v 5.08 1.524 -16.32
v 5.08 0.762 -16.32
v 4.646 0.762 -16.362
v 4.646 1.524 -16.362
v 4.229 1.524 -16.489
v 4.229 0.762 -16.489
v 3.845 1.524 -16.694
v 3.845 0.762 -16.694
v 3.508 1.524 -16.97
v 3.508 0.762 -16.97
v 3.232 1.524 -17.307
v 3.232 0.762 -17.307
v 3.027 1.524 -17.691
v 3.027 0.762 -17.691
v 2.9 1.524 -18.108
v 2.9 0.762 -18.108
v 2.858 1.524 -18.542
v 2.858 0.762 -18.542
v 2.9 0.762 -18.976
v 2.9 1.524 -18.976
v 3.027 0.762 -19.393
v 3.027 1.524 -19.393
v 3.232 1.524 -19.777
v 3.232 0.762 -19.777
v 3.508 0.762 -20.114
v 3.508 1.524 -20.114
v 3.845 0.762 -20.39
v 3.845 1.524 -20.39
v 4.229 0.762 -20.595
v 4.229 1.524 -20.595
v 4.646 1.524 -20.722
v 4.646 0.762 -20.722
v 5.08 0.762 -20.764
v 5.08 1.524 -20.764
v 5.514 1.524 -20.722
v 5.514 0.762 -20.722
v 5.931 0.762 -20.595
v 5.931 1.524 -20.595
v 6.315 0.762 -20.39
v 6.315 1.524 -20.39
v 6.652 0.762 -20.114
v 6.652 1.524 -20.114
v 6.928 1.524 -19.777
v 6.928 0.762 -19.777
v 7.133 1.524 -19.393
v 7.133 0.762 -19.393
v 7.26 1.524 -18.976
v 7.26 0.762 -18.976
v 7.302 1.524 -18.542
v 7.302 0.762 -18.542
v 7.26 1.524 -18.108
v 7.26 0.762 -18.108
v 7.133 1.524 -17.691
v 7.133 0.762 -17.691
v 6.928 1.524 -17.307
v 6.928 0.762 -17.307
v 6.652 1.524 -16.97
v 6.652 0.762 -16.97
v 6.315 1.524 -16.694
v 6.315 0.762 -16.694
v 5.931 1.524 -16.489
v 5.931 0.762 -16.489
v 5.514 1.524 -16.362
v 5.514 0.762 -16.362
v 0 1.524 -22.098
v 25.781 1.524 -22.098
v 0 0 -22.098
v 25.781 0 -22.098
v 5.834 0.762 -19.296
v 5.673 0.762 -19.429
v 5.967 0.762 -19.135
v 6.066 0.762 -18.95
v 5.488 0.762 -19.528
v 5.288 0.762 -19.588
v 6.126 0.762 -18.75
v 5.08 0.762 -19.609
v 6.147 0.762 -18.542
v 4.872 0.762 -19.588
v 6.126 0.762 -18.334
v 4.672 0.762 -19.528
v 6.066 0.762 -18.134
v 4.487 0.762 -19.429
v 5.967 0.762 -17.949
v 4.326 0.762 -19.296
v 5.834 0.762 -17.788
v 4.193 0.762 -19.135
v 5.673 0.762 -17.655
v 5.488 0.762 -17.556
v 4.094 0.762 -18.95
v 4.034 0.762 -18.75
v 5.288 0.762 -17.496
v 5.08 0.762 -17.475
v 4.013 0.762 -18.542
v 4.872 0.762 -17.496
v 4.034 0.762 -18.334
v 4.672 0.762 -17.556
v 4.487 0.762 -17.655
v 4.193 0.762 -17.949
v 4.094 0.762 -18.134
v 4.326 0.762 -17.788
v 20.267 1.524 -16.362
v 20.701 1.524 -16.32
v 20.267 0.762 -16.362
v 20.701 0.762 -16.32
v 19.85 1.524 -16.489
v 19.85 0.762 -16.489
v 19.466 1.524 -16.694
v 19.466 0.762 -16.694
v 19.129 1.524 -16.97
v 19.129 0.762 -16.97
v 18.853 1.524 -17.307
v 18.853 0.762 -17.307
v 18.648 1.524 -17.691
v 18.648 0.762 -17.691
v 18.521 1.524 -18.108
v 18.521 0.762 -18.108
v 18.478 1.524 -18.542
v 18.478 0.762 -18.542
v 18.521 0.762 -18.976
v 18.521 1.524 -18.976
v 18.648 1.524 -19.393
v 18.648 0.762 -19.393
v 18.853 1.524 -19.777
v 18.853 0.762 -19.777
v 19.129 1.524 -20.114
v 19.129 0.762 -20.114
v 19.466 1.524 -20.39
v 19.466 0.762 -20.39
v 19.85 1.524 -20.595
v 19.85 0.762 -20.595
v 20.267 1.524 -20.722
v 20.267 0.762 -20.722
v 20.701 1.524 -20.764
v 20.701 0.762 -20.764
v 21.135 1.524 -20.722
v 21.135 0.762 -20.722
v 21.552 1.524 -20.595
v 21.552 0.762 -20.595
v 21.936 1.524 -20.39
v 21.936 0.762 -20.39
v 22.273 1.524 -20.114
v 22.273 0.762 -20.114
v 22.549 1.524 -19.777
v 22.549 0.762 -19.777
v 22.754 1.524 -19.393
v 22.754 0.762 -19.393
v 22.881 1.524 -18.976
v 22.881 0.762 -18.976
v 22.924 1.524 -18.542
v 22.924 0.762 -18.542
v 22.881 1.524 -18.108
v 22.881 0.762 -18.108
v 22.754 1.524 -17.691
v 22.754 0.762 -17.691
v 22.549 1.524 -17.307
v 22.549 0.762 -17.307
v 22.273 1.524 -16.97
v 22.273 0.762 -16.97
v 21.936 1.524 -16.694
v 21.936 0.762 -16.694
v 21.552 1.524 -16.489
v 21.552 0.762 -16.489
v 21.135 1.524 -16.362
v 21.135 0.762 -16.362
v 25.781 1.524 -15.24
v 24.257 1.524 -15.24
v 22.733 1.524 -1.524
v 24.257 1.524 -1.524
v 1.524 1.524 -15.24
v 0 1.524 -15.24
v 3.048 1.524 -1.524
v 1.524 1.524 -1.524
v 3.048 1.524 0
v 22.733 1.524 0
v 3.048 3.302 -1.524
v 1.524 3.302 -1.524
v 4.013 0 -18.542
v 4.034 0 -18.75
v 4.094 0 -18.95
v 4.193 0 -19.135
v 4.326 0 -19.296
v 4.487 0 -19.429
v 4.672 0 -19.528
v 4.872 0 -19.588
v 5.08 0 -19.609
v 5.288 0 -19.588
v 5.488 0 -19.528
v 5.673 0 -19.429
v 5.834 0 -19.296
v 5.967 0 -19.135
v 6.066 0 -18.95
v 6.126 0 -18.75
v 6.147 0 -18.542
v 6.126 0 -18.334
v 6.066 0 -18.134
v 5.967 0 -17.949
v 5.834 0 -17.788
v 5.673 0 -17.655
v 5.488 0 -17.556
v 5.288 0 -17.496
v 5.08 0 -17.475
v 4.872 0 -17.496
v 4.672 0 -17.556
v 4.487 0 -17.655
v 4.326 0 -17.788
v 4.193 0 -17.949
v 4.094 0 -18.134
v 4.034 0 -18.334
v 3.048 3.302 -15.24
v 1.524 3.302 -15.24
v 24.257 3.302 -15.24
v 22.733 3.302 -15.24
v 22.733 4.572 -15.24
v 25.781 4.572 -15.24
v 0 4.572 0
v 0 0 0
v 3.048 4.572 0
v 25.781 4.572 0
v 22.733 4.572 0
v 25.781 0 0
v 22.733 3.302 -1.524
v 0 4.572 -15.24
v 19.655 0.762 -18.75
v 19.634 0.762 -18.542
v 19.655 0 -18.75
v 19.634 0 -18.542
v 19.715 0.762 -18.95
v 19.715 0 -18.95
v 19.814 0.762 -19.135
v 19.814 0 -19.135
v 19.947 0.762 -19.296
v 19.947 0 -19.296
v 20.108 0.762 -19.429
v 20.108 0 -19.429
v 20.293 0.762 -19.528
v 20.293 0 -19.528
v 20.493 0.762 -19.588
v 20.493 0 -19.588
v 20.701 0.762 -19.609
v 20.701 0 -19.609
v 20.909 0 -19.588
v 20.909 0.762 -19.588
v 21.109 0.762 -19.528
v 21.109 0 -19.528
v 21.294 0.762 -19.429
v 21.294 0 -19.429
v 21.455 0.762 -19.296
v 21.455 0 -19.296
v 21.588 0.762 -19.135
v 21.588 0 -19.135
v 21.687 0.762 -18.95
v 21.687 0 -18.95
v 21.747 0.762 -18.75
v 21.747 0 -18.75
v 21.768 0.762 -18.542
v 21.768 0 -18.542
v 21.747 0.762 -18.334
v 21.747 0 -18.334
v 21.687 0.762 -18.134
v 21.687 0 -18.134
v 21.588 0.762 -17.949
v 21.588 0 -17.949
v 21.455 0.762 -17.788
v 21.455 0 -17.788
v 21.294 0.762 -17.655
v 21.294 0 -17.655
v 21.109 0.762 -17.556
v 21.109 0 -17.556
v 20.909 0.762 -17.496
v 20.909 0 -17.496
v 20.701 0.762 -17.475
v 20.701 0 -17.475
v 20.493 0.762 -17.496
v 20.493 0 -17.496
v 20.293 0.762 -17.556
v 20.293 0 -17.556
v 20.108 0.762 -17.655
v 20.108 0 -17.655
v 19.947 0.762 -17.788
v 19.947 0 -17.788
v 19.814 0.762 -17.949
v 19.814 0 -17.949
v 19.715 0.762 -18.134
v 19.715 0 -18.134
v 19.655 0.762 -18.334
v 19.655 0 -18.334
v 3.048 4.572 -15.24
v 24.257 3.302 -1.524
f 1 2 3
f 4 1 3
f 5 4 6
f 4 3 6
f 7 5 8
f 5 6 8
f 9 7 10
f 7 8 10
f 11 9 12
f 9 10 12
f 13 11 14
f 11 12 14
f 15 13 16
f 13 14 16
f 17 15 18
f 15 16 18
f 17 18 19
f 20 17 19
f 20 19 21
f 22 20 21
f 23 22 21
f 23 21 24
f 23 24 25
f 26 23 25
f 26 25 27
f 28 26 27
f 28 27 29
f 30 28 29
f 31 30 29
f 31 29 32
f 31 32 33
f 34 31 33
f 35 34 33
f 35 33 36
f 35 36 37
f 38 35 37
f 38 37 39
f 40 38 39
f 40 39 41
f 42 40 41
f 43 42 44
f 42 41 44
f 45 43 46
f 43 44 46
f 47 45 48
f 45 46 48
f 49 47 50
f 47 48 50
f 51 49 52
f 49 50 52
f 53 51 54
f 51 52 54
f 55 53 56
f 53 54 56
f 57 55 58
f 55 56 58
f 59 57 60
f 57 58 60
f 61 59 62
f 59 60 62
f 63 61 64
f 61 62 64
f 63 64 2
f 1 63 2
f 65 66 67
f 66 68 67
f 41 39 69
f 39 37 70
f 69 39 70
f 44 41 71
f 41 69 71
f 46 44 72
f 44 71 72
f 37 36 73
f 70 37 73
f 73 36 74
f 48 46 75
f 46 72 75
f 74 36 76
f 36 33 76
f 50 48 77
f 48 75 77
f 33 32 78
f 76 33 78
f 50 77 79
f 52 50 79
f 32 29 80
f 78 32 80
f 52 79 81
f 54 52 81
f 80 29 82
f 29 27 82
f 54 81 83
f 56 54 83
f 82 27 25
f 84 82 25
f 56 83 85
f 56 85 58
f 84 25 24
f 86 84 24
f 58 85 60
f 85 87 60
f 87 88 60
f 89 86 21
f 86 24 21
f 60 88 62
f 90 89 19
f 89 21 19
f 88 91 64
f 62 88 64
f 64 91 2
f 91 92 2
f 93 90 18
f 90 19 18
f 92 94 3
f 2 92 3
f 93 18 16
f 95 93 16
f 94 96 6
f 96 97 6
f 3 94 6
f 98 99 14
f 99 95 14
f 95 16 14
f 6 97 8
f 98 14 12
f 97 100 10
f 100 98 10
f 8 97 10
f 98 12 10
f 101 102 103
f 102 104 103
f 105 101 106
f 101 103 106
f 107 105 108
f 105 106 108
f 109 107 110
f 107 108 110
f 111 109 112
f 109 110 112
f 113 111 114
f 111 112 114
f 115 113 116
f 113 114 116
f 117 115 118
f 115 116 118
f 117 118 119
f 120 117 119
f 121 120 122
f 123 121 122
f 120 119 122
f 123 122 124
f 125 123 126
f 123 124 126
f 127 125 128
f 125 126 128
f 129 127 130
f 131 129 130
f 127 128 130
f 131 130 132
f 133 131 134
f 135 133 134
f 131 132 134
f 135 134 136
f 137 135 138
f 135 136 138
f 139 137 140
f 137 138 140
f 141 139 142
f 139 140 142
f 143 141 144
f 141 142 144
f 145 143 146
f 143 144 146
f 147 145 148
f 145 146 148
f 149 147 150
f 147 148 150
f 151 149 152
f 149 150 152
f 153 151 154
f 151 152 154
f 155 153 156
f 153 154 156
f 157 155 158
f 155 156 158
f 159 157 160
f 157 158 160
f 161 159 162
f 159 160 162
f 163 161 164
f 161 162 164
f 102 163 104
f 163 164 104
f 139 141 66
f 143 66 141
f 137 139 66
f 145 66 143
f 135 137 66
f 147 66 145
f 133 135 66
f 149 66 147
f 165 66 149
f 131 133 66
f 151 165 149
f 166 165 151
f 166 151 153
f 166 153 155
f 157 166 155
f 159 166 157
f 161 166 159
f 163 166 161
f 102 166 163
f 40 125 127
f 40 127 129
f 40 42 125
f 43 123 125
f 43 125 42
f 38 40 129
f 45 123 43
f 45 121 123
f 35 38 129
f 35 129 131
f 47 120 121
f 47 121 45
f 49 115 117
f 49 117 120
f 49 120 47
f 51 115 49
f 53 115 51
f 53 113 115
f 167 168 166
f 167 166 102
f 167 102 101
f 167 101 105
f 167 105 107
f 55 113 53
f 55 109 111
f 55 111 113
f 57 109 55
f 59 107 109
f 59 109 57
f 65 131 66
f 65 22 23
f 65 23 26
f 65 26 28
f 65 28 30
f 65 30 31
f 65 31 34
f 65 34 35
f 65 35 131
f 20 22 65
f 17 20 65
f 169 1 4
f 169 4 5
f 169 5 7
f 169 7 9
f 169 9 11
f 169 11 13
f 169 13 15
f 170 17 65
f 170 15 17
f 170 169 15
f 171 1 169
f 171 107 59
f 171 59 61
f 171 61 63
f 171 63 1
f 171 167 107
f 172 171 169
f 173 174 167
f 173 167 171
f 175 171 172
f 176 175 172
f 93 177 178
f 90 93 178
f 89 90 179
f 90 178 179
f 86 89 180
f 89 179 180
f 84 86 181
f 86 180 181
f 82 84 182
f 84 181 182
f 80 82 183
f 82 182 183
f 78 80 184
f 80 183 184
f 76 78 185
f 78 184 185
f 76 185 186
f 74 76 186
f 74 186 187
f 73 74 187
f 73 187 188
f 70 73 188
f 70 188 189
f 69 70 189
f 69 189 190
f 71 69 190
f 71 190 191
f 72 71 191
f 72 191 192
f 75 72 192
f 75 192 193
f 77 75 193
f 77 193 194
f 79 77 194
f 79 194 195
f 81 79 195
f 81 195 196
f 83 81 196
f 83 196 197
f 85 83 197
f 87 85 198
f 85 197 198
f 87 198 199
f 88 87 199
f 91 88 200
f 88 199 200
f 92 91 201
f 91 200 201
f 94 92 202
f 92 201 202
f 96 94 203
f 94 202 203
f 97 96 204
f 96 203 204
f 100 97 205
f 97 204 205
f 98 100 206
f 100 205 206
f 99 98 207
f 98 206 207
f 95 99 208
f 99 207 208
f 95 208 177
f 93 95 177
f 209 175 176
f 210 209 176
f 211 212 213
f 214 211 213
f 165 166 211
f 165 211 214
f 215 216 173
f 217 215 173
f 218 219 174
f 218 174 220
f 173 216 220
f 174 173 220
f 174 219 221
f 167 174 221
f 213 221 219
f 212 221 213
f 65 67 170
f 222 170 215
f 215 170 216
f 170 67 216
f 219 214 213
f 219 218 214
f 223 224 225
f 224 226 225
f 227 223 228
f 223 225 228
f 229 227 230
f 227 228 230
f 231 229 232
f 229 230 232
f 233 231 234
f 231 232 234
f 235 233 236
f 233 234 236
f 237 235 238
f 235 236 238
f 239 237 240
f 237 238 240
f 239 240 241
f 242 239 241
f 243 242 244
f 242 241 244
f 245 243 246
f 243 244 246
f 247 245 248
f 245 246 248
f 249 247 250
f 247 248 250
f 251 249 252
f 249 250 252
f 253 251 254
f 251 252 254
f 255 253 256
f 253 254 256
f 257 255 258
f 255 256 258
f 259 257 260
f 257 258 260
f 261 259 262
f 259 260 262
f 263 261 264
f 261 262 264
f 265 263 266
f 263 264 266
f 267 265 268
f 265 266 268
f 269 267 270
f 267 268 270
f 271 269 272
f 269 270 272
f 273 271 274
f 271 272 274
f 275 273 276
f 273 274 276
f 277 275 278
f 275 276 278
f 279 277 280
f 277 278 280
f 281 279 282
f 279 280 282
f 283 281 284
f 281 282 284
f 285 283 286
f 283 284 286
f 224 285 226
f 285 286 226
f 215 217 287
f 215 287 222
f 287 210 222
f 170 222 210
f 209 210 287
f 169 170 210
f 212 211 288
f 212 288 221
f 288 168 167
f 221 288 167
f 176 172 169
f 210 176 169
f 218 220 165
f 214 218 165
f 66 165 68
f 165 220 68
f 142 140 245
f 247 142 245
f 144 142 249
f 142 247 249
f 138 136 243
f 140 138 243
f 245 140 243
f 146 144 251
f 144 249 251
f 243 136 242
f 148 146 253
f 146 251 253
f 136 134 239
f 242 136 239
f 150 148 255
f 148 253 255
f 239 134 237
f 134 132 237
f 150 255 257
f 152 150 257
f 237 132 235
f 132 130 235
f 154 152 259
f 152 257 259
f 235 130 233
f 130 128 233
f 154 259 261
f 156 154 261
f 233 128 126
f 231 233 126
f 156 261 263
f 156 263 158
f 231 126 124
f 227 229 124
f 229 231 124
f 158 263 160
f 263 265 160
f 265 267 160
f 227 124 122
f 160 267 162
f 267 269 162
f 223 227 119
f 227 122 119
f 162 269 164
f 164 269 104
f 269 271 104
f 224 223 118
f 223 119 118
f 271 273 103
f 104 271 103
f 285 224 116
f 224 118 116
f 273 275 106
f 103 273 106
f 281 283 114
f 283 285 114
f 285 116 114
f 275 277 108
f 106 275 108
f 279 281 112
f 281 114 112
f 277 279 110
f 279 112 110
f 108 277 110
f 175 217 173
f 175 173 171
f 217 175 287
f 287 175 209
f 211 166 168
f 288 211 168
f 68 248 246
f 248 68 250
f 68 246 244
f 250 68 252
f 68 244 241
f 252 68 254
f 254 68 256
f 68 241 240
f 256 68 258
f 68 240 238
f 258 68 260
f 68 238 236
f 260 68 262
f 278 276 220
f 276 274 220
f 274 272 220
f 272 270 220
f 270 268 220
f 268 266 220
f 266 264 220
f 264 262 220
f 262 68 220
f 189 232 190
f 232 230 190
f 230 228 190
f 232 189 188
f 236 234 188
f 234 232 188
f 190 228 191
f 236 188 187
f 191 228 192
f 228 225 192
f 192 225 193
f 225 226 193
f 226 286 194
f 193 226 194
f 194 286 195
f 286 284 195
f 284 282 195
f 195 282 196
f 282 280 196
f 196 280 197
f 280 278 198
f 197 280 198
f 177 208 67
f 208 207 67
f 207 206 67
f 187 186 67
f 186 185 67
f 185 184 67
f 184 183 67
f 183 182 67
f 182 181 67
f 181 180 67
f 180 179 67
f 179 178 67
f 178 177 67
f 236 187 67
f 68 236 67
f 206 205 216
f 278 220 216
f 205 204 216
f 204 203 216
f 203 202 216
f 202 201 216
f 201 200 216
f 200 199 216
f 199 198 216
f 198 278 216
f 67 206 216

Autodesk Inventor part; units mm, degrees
sketch "Sketch1" plane through (0, 0, 0) normal (0, 1, 0) x (-1, 0, 0)
  line L0 (0, 0) -> (-25.781, 0)
  line L1 (-25.781, 0) -> (-25.781, -22.098)
  line L2 (-25.781, -22.098) -> (0, -22.098)
  line L3 (0, -22.098) -> (0, 0)
  line L4 (-1.524, -20.574) -> (-24.257, -20.574)
  line L5 (-24.257, -20.574) -> (-24.257, -1.524)
  line L6 (-24.257, -1.524) -> (-1.524, -1.524)
  line L7 (-1.524, -1.524) -> (-1.524, -20.574)
  line L8 (-3.048, 0) -> (-3.048, -1.524)
  line L9 (-22.733, 0) -> (-22.733, -1.524)
  line L10 (-3.048, -20.574) -> (-3.048, -22.098)
  line L11 (-3.048, -1.524) -> (-3.048, -20.574)
  line L12 (-22.733, -1.524) -> (-22.733, -20.574)
  line L13 (-22.733, -20.574) -> (-22.733, -22.098)
  line L14 (0, -15.24) -> (-1.524, -15.24)
  line L15 (-24.257, -15.24) -> (-25.781, -15.24)
  line L16 (-1.524, -15.24) -> (-3.048, -15.24)
  line L17 (-24.257, -15.24) -> (-22.733, -15.24)
  circle A0 centre (-5.08, -18.542) radius 1.0668
  circle A1 centre (-20.701, -2.032) radius 1.0668
  circle A2 centre (-20.701, -18.542) radius 1.0668
  circle A3 centre (-5.08, -2.032) radius 1.0668
  dimension "d2" = 1.524
  dimension "d3" = 19.05
  dimension "d4" = 22.733
  dimension "d5" = 1.524
  dimension "d6" = 1.524
  dimension "d10" = 6.858
  dimension "d11" = 6.858
  dimension "d19" = 2.1336
  dimension "d22" = 2.032
  dimension "d23" = 2.032
  dimension "d24" = 2.032
  dimension "d25" = 16.51
  dimension "d26" = 16.51
extrude "Extrusion2" add sketch "Sketch1" along normal blind 3.302 contours L3 L14 L7 L6 L8 L0 | L9 L6 L5 L15 L1 L0
ref_plane "Work Plane1" through (0, 3.302, 0) normal (0, 1, 0) x (1, 0, 0)
ref_plane "Work Plane2" through (0, 4.572, 0) normal (0, 1, 0) x (1, 0, 0)
extrude "Extrusion3" add sketch "Sketch1" along normal up to surface (1.27 mm away) from surface at 3.302 contours L3 L14 L7 L6 L8 L0 | L9 L6 L5 L15 L1 L0 | L6 L7 L16 L11 | L12 L17 L5 L6
ref_plane "Work Plane3" through (0, 1.524, 0) normal (0, 1, 0) x (1, 0, 0)
sketch "Sketch2" plane through (0, 1.524, 0) normal (0, 1, 0) x (1, 0, 0)
  circle A0 centre (5.08, 18.542) radius 1.0668 projected
  circle A1 centre (20.701, 18.542) radius 1.0668
  circle A2 centre (20.701, 2.032) radius 1.0668
  circle A3 centre (5.08, 2.032) radius 1.0668 projected
  circle A4 centre (20.701, 2.032) radius 1.0668 projected
  circle A5 centre (20.701, 18.542) radius 1.0668 projected
  point P0 (0, 0)
extrude "Extrusion7" add sketch "Sketch1" along normal blind 1.524 contours L8 L6 A3 A1 L9 L0 | L3 L2 L10 L4 L7 L14 | L11 L4 L12 L6 A1 A3 | L6 L7 L16 L11 | L7 L4 L11 L16 | L12 L17 L5 L6 | A3 L6 | L6 A3 | L2 L13 L4 L10 | L15 L5 L4 L13 L2 L1 | A1 L6 | L6 A1 | L12 L4 L5 L17
hole "Hole2" at (20.701, 1.524, -18.542) at (5.08, 1.524, -18.542) direction (0, -1, 0) diameter 0.4763 end through all counterbore diameter 4.445 counterbore depth 0.762
properties part number "ShockSensorMount" material "Glass"
